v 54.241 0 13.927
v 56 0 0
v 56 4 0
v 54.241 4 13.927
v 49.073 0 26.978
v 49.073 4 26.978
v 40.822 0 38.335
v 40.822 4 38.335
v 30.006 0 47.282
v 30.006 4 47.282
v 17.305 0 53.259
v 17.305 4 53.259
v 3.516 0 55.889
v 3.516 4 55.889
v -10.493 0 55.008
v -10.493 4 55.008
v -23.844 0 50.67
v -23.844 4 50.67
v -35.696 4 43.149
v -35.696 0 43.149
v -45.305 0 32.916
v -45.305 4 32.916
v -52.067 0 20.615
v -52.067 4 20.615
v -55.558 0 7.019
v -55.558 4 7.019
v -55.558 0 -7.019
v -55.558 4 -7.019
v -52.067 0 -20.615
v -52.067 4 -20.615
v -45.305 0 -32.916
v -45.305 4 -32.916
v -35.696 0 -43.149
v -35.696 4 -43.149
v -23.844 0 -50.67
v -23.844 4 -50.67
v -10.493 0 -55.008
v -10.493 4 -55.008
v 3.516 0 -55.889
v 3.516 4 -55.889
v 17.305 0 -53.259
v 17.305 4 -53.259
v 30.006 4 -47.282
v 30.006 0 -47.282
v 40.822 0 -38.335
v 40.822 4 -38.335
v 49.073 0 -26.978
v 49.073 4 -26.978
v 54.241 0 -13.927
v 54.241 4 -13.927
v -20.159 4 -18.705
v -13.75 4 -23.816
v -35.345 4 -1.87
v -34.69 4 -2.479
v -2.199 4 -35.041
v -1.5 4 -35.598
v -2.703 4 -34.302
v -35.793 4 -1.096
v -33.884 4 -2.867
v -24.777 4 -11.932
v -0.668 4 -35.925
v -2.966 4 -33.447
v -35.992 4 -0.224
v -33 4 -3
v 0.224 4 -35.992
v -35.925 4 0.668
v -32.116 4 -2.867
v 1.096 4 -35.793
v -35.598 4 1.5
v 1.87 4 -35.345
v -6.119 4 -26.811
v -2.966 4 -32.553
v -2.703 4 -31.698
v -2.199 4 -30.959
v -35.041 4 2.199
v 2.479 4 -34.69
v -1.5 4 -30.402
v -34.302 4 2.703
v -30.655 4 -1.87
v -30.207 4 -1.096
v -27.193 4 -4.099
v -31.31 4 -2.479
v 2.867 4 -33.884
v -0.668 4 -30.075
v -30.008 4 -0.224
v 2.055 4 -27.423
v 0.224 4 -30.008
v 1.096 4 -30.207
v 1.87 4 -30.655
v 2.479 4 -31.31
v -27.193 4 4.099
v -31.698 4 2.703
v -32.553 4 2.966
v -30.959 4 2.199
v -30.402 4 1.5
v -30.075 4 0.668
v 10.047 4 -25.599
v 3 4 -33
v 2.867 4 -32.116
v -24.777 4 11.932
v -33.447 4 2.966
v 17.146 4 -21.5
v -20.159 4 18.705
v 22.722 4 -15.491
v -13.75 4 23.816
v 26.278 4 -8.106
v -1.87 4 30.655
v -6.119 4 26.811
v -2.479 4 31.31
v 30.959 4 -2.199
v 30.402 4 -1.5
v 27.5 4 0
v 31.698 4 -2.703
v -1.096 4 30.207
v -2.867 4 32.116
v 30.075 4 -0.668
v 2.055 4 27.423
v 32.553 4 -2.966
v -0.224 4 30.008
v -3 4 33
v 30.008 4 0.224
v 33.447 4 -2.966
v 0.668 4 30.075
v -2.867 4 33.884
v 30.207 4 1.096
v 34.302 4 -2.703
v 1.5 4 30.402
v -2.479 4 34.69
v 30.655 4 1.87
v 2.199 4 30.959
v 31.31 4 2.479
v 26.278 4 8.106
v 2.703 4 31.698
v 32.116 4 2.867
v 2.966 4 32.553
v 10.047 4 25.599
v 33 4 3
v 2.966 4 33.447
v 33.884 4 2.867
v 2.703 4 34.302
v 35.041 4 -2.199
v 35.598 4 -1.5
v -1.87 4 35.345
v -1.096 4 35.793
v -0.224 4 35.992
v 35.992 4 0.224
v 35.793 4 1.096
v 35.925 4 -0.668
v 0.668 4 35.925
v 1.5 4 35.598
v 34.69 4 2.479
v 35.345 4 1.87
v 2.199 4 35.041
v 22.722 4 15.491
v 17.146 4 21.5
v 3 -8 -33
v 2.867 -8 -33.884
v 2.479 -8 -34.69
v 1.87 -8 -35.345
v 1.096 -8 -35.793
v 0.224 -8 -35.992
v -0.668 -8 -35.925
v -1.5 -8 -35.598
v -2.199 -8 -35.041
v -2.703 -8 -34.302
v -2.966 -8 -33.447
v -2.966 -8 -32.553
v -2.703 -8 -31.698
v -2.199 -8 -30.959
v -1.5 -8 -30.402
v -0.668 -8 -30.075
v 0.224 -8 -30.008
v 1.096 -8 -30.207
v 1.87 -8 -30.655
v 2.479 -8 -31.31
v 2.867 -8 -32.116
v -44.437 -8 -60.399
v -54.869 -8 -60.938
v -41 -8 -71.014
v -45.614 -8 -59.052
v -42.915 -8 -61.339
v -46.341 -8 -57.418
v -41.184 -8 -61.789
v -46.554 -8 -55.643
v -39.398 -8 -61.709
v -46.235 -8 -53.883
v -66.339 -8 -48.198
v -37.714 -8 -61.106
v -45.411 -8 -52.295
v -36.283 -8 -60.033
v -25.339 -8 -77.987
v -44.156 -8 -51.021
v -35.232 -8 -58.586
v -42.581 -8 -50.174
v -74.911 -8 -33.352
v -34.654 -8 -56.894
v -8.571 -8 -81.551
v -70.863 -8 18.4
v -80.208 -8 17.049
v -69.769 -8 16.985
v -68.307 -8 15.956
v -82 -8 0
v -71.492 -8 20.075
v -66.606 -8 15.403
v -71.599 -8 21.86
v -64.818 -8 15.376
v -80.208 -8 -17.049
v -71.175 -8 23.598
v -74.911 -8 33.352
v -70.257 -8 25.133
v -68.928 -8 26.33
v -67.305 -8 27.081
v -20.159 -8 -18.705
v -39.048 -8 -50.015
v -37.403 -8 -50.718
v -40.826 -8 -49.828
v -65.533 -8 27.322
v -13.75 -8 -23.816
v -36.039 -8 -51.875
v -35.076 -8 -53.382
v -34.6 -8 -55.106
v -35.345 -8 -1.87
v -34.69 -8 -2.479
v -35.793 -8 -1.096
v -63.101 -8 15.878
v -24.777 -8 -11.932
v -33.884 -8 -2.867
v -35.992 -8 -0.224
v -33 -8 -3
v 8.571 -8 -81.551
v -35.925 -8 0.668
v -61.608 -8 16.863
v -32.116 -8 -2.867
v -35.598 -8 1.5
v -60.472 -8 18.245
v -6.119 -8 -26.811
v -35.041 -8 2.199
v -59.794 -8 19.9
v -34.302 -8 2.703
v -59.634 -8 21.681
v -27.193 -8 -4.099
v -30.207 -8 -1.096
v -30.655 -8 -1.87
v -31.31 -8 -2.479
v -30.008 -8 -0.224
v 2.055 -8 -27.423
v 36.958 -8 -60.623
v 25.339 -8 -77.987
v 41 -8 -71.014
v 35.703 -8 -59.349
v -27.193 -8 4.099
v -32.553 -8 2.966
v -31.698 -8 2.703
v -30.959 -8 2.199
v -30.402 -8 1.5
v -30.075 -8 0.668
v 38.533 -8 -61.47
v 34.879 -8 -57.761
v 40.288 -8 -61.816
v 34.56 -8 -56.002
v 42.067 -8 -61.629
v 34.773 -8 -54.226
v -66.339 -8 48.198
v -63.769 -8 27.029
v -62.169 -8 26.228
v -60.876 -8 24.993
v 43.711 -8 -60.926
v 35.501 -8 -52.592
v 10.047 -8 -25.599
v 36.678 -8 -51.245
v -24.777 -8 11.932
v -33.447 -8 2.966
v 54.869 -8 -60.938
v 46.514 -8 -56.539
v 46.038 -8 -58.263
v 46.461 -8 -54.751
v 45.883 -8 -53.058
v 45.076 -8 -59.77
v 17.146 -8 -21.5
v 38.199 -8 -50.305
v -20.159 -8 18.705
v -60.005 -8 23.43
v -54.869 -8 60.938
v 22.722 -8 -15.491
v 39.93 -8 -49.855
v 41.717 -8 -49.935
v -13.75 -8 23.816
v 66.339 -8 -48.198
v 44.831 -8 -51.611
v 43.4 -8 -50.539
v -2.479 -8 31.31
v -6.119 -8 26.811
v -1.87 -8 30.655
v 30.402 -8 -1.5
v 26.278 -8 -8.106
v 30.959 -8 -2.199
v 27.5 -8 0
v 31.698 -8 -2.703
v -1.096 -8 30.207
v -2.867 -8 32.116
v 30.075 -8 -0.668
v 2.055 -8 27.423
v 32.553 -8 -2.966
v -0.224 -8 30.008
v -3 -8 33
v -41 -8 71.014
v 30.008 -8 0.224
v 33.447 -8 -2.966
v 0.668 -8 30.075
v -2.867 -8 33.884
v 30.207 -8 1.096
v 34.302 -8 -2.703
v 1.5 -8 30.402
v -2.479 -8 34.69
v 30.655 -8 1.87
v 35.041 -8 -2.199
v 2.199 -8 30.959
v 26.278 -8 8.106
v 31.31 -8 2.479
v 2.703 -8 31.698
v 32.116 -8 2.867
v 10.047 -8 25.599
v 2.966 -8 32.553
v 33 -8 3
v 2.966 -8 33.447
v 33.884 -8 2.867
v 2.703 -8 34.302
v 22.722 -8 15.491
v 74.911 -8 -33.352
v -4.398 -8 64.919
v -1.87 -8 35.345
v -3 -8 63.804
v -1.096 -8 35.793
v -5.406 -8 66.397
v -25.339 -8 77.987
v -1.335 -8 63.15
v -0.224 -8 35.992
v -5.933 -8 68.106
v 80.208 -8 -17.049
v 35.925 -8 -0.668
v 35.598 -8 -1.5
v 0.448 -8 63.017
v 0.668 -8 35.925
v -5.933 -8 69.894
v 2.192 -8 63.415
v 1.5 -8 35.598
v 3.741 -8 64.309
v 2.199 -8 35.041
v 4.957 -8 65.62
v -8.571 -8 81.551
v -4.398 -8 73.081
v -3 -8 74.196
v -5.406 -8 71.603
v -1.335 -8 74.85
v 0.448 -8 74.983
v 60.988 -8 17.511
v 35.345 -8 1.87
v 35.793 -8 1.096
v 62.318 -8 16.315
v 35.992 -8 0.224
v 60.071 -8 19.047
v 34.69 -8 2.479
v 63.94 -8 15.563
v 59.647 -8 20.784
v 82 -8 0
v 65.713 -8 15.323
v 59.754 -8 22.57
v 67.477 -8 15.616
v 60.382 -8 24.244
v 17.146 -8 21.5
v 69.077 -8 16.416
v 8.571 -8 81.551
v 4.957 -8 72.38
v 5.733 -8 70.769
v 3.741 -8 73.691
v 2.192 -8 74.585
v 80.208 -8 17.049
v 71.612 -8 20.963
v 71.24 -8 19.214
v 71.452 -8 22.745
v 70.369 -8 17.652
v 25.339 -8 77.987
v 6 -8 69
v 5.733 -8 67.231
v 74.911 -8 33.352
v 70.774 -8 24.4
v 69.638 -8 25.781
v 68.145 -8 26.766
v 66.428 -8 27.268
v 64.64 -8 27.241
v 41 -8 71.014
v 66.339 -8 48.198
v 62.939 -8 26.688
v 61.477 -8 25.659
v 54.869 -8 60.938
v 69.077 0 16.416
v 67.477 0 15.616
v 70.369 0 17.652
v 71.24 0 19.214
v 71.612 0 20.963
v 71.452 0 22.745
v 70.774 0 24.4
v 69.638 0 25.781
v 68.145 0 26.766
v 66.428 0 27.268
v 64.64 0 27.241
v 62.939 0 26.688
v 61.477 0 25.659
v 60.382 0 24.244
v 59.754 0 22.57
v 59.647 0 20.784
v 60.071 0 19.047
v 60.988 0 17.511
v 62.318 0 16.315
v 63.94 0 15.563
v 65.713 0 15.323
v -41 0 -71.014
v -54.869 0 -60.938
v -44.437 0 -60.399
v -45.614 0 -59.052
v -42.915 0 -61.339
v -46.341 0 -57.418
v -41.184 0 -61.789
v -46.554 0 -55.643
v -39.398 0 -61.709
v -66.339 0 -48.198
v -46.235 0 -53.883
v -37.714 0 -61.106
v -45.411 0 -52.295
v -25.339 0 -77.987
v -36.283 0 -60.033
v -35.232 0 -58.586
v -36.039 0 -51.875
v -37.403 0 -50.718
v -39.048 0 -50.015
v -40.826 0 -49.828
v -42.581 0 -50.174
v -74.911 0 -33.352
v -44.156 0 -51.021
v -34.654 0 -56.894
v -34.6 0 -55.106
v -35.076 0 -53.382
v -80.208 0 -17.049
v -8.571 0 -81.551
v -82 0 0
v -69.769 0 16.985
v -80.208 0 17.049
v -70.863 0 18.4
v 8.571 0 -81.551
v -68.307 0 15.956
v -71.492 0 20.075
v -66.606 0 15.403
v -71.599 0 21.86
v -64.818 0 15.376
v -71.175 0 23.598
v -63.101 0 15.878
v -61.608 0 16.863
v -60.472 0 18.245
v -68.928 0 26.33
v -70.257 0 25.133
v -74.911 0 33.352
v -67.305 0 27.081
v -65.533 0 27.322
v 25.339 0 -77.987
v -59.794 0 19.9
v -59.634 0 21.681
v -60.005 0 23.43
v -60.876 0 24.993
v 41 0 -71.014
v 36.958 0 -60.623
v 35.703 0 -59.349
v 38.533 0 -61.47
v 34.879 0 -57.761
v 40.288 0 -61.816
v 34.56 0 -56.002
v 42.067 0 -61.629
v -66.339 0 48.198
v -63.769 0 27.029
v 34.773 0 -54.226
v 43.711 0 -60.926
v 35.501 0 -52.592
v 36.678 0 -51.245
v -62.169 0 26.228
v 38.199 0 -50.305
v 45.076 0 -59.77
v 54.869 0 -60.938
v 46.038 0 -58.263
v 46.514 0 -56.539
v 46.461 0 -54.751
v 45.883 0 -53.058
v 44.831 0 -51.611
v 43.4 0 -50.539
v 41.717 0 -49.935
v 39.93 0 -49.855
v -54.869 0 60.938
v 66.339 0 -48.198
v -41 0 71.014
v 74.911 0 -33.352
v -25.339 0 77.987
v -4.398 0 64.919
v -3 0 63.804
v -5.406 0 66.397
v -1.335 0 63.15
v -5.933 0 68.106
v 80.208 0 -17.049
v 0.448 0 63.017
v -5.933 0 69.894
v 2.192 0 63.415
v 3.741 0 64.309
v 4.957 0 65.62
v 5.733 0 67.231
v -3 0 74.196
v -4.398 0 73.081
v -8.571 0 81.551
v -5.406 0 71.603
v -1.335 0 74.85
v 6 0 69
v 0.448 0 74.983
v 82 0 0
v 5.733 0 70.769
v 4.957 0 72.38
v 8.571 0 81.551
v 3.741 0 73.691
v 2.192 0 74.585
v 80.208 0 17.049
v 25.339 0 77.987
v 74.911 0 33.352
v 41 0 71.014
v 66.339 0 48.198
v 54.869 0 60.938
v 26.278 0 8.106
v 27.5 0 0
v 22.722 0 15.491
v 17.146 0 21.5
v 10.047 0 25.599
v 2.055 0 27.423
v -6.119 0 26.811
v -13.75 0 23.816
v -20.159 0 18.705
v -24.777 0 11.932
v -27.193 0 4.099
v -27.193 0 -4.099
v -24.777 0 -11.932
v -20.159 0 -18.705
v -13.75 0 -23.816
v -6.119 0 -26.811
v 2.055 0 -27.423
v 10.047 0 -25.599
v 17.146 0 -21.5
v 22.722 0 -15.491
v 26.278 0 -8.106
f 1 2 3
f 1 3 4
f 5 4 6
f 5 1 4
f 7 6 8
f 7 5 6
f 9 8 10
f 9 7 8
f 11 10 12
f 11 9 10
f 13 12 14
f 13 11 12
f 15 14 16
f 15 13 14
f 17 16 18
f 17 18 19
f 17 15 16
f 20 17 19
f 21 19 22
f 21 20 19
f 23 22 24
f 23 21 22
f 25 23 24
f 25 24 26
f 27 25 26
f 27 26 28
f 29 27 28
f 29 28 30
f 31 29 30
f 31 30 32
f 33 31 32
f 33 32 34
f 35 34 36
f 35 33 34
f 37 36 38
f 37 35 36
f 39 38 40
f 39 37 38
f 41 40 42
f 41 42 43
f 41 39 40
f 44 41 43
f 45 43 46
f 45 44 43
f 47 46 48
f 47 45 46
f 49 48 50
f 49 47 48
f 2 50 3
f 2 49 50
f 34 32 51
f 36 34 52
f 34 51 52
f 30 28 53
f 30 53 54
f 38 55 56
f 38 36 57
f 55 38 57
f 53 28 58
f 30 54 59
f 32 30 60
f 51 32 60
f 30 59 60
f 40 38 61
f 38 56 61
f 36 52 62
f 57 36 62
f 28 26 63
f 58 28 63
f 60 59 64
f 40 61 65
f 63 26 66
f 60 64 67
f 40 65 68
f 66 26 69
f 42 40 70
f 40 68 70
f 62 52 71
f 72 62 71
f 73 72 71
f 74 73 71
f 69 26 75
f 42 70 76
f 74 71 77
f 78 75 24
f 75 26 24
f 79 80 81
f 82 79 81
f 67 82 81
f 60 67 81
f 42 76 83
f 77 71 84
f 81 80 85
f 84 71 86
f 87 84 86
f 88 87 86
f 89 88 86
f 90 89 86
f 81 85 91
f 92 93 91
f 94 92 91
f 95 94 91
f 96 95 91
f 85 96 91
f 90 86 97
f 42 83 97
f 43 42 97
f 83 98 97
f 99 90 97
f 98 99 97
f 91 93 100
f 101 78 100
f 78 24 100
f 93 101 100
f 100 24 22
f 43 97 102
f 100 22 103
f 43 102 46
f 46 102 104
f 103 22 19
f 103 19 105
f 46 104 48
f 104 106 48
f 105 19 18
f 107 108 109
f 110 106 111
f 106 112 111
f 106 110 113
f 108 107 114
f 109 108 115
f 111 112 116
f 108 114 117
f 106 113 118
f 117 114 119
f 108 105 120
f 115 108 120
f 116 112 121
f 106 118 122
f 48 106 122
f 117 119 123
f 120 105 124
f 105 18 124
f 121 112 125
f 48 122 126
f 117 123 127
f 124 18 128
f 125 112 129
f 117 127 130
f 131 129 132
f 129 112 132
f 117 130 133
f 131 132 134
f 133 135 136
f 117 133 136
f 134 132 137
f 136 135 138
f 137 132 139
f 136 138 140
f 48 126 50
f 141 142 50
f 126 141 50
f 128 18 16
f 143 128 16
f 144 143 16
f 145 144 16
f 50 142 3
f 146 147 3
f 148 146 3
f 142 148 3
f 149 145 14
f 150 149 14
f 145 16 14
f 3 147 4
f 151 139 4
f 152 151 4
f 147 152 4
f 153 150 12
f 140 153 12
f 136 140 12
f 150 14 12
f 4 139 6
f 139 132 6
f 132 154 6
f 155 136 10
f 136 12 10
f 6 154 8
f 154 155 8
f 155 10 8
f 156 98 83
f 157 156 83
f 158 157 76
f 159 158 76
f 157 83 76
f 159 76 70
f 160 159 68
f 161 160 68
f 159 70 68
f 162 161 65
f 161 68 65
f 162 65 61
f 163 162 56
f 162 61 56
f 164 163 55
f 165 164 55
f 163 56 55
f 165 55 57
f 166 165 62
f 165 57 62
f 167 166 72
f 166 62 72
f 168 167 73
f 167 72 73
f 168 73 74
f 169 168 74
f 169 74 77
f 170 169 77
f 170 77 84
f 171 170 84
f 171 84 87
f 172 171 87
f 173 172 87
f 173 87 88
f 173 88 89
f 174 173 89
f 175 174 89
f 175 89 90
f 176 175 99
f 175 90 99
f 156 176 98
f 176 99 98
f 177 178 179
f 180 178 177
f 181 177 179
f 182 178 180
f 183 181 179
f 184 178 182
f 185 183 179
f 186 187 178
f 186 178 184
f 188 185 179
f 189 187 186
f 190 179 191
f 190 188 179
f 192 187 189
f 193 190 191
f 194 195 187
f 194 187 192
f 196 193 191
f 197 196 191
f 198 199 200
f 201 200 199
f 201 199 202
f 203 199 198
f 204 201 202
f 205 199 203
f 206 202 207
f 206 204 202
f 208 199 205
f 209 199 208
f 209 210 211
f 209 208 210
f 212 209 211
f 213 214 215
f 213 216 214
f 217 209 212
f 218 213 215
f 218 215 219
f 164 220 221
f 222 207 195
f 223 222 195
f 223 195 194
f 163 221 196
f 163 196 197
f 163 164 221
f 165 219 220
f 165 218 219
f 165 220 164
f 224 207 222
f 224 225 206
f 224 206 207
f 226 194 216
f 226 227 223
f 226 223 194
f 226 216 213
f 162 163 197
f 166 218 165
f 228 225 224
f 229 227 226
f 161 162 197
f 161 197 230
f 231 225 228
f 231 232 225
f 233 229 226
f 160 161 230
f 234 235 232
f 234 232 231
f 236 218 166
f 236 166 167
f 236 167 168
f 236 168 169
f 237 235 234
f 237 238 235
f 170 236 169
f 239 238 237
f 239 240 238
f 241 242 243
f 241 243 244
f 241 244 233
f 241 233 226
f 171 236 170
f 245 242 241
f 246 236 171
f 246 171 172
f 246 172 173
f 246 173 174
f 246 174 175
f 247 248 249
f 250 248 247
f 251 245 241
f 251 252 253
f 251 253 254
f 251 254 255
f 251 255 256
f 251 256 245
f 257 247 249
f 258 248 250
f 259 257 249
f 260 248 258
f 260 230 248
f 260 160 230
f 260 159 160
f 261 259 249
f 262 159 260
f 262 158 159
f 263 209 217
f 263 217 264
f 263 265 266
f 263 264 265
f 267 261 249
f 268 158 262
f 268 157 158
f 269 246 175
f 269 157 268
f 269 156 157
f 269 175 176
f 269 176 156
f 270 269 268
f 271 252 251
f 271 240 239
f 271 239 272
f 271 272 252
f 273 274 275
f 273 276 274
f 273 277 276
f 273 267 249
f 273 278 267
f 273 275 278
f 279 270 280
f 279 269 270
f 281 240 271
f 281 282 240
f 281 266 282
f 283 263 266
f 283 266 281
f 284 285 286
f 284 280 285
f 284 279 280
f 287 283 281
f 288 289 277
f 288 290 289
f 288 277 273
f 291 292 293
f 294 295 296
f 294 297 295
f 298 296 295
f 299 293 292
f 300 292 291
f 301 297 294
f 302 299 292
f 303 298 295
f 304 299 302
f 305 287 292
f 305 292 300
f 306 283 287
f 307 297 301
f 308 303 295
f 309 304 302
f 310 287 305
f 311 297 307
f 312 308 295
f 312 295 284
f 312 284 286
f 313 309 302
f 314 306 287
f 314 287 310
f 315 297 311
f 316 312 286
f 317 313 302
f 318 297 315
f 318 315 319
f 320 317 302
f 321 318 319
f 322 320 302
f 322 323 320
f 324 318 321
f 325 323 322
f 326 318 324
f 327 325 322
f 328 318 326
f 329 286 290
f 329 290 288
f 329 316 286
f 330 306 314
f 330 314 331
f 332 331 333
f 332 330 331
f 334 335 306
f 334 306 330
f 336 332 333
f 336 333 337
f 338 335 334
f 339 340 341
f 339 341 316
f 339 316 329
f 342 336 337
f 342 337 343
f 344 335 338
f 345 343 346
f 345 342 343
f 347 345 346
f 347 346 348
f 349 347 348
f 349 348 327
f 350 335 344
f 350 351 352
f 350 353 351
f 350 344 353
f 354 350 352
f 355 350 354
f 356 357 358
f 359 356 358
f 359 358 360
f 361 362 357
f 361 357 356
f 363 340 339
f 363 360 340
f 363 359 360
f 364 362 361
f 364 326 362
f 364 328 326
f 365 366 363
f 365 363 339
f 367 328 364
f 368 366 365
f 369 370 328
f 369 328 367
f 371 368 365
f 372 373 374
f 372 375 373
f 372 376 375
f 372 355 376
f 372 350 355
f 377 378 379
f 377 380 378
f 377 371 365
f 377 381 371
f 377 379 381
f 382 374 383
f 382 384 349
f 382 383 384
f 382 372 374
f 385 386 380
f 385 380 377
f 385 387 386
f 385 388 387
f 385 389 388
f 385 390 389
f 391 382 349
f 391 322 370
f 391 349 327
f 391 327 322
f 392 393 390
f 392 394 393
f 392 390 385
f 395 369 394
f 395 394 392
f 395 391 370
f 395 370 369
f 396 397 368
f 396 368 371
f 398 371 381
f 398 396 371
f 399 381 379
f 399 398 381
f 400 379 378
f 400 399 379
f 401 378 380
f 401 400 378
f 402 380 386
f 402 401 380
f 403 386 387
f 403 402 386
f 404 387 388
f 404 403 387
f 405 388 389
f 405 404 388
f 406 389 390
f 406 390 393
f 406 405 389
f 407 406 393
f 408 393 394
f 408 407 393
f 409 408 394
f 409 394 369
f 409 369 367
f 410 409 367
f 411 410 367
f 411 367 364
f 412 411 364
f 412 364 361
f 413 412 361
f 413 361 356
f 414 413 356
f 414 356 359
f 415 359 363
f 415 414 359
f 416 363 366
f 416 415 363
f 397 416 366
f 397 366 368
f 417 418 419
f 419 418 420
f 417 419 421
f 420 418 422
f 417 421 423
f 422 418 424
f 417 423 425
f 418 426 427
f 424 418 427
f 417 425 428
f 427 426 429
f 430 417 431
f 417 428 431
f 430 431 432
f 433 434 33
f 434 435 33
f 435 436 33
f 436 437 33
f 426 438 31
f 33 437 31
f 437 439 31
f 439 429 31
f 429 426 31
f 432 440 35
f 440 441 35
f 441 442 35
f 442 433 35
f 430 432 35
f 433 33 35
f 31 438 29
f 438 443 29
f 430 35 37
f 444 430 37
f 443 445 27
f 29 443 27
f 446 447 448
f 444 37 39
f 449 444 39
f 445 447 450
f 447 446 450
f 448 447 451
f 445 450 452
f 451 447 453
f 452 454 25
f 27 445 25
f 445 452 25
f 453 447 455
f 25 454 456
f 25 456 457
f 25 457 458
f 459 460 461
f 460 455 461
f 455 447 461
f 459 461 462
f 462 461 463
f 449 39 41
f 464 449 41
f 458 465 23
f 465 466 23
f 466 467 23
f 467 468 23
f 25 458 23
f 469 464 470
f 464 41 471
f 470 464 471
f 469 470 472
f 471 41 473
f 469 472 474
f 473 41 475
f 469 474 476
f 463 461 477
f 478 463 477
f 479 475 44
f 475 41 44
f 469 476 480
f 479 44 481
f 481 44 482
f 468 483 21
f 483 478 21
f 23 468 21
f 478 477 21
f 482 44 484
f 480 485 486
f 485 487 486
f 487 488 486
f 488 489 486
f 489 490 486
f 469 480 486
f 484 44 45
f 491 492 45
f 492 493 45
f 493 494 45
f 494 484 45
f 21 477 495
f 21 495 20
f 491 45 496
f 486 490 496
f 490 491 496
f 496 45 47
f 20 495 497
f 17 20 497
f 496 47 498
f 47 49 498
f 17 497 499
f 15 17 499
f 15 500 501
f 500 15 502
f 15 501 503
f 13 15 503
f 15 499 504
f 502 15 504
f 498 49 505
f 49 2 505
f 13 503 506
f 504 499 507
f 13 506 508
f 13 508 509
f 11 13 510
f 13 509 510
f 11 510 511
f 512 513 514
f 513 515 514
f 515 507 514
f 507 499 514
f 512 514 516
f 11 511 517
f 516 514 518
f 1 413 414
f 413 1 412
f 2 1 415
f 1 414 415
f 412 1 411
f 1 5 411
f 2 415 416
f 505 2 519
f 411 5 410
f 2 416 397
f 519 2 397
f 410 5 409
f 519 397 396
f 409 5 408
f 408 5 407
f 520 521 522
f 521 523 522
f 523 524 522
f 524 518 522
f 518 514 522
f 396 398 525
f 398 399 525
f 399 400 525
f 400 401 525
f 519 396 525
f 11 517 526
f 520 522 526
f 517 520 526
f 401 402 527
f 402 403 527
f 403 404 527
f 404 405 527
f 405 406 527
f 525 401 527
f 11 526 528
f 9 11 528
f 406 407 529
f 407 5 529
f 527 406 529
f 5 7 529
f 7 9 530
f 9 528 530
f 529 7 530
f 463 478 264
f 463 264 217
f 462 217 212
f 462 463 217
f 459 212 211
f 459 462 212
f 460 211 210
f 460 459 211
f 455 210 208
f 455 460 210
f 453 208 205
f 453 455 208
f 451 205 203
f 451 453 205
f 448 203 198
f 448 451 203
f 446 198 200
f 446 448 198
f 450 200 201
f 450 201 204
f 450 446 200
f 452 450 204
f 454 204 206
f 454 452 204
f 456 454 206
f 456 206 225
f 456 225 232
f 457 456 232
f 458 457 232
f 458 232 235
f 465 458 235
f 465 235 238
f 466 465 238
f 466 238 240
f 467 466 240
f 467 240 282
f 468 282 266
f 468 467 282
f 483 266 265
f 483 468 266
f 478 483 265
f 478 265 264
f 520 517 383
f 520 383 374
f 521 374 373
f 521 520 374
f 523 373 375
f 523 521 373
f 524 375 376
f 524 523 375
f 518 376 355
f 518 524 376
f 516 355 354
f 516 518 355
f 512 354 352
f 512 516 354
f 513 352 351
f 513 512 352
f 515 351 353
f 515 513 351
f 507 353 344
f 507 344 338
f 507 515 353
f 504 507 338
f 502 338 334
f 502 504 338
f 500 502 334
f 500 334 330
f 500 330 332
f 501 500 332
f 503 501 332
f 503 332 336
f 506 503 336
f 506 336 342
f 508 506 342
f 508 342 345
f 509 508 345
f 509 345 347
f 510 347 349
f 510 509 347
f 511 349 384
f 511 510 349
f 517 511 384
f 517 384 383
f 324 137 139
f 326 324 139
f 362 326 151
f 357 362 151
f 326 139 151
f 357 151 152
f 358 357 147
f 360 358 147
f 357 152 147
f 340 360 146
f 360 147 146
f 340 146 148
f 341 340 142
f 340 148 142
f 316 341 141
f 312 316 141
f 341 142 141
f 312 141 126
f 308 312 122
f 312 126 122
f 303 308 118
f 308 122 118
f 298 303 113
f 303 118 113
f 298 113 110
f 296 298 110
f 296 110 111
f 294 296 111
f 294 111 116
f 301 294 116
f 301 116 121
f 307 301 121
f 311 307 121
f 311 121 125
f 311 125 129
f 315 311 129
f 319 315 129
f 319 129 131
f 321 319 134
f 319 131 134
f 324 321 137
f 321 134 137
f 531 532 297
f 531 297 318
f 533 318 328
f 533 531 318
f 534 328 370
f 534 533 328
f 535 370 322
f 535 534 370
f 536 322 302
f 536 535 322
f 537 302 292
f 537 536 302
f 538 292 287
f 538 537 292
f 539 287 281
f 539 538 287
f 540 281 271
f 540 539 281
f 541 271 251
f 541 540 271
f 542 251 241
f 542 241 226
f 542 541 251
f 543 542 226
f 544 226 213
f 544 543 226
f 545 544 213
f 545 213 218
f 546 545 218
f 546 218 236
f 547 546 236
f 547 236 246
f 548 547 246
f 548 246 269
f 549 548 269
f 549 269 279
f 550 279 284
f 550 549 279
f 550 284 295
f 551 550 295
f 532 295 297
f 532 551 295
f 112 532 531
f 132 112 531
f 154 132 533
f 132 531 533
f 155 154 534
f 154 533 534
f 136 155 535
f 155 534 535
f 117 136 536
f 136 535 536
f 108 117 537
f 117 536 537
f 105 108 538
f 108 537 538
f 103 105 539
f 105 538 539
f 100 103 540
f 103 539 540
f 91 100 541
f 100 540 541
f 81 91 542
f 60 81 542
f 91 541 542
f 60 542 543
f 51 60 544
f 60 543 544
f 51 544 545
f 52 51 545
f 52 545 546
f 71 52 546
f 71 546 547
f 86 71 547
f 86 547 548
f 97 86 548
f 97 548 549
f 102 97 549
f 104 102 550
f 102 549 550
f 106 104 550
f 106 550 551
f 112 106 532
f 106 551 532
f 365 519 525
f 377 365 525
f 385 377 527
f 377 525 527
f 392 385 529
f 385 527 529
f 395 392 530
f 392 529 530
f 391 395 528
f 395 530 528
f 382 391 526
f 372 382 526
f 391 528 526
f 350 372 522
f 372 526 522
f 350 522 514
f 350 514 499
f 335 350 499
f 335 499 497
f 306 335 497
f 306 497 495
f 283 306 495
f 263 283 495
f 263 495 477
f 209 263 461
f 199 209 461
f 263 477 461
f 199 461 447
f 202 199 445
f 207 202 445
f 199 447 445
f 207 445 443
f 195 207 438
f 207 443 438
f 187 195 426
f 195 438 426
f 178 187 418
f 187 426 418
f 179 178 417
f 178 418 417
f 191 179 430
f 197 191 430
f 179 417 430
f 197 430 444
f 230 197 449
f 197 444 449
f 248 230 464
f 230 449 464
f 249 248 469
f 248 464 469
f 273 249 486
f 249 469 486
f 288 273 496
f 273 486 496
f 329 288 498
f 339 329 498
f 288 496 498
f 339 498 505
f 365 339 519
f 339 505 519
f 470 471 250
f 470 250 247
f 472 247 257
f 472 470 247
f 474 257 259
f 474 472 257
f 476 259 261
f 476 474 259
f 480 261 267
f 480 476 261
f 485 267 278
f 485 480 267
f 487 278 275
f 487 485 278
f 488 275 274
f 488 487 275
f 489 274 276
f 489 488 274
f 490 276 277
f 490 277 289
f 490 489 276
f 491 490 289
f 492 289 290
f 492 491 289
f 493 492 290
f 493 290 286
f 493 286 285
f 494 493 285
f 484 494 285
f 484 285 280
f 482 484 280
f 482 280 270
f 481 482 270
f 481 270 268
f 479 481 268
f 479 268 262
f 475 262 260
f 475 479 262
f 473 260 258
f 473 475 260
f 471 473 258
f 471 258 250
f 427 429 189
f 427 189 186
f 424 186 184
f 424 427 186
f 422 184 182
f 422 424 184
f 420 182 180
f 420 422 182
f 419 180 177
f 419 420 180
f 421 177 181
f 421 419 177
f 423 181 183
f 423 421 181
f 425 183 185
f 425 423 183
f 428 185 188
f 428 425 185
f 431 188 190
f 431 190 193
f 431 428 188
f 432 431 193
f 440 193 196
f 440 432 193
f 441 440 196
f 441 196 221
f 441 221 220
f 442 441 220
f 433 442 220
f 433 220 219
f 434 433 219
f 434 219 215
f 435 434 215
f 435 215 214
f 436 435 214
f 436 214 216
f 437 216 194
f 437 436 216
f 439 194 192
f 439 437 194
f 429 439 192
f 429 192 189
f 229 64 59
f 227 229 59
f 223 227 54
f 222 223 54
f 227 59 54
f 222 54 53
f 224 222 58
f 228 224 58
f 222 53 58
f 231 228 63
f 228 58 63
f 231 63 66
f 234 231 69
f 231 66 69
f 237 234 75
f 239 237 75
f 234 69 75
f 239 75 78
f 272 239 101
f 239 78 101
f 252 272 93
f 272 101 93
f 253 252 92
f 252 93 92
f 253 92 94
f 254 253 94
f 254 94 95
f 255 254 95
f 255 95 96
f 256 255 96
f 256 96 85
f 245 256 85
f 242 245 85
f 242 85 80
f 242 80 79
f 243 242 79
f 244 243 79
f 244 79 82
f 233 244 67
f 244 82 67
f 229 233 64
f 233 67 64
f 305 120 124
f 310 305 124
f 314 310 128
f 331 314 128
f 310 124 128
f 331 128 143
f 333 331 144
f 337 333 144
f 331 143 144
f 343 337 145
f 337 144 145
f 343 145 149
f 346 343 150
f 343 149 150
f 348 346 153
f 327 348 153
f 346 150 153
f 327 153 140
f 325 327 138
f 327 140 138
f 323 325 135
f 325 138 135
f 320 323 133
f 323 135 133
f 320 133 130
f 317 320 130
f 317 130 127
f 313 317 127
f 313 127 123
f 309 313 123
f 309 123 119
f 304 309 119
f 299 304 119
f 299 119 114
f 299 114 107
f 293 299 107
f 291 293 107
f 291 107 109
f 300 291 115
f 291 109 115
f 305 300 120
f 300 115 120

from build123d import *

# Parameters (mm, degrees)
F0_R            = 82
F0_R_2          = 56
F0_R_3          = 6
F0_R_4          = 27.5
F0_R_5          = 3
F1_DEPTH        = 8
F2_DEPTH        = 4
F3_DEPTH        = 8
F3_COPIES_COUNT = 5
F4_R            = 3
F5_DEPTH        = 12
F5_COPIES_COUNT = 4


# Not quite as in the source:
# - a pattern or mirror of a feature is missing from the dataset's text; its kind, count and spacing are read off the source's solid


with BuildPart() as f1:
    # F0 (on Front) → F1 (new body)
    with BuildSketch(Plane.XZ):
        Circle(F0_R)
        Circle(F0_R_2, mode=Mode.SUBTRACT)
        with Locations((0, 69)):
            Circle(F0_R_3, mode=Mode.SUBTRACT)
        Circle(F0_R_2)
        Circle(F0_R_4, mode=Mode.SUBTRACT)
        with Locations((0, 33)):
            Circle(F0_R_5, mode=Mode.SUBTRACT)
        with Locations((0, 69)):
            Circle(F0_R_3)
        with Locations((0, 33)):
            Circle(F0_R_5)
    extrude(amount=F1_DEPTH)

    # F0 (on Front) → F2 (join)
    with BuildSketch(Plane.XZ):
        Circle(F0_R_2)
        Circle(F0_R_4, mode=Mode.SUBTRACT)
        with Locations((0, 33)):
            Circle(F0_R_5, mode=Mode.SUBTRACT)
        with Locations((0, 33)):
            Circle(F0_R_5)
    extrude(amount=-F2_DEPTH)

    # F0 (on Front) → F3 (cut)
    with BuildSketch(Plane.XZ):
        with Locations((0, 69)):
            Circle(F0_R_3)
    f3 = extrude(amount=F3_DEPTH, mode=Mode.SUBTRACT)

    # F3_copies: F3 ×5 about axis
    f3_copies_axis = Axis((0, 0, 0), (0, 1, 0))
    for i in range(1, F3_COPIES_COUNT):
        add(f3.rotate(f3_copies_axis, i * 360 / F3_COPIES_COUNT), mode=Mode.SUBTRACT)

    # F4 (on face) → F5 (cut)
    with BuildSketch(Plane(origin=(0, 4, 0), x_dir=(-1, 0, 0), z_dir=(0, 1, 0))):
        with Locations((0, 33)):
            Circle(F4_R)
    f5 = extrude(amount=-F5_DEPTH, mode=Mode.SUBTRACT)

    # F5_copies: F5 ×4 about axis
    f5_copies_axis = Axis((0, 0, 0), (0, 1, 0))
    for i in range(1, F5_COPIES_COUNT):
        add(f5.rotate(f5_copies_axis, i * 360 / F5_COPIES_COUNT), mode=Mode.SUBTRACT)


solid = f1.part
